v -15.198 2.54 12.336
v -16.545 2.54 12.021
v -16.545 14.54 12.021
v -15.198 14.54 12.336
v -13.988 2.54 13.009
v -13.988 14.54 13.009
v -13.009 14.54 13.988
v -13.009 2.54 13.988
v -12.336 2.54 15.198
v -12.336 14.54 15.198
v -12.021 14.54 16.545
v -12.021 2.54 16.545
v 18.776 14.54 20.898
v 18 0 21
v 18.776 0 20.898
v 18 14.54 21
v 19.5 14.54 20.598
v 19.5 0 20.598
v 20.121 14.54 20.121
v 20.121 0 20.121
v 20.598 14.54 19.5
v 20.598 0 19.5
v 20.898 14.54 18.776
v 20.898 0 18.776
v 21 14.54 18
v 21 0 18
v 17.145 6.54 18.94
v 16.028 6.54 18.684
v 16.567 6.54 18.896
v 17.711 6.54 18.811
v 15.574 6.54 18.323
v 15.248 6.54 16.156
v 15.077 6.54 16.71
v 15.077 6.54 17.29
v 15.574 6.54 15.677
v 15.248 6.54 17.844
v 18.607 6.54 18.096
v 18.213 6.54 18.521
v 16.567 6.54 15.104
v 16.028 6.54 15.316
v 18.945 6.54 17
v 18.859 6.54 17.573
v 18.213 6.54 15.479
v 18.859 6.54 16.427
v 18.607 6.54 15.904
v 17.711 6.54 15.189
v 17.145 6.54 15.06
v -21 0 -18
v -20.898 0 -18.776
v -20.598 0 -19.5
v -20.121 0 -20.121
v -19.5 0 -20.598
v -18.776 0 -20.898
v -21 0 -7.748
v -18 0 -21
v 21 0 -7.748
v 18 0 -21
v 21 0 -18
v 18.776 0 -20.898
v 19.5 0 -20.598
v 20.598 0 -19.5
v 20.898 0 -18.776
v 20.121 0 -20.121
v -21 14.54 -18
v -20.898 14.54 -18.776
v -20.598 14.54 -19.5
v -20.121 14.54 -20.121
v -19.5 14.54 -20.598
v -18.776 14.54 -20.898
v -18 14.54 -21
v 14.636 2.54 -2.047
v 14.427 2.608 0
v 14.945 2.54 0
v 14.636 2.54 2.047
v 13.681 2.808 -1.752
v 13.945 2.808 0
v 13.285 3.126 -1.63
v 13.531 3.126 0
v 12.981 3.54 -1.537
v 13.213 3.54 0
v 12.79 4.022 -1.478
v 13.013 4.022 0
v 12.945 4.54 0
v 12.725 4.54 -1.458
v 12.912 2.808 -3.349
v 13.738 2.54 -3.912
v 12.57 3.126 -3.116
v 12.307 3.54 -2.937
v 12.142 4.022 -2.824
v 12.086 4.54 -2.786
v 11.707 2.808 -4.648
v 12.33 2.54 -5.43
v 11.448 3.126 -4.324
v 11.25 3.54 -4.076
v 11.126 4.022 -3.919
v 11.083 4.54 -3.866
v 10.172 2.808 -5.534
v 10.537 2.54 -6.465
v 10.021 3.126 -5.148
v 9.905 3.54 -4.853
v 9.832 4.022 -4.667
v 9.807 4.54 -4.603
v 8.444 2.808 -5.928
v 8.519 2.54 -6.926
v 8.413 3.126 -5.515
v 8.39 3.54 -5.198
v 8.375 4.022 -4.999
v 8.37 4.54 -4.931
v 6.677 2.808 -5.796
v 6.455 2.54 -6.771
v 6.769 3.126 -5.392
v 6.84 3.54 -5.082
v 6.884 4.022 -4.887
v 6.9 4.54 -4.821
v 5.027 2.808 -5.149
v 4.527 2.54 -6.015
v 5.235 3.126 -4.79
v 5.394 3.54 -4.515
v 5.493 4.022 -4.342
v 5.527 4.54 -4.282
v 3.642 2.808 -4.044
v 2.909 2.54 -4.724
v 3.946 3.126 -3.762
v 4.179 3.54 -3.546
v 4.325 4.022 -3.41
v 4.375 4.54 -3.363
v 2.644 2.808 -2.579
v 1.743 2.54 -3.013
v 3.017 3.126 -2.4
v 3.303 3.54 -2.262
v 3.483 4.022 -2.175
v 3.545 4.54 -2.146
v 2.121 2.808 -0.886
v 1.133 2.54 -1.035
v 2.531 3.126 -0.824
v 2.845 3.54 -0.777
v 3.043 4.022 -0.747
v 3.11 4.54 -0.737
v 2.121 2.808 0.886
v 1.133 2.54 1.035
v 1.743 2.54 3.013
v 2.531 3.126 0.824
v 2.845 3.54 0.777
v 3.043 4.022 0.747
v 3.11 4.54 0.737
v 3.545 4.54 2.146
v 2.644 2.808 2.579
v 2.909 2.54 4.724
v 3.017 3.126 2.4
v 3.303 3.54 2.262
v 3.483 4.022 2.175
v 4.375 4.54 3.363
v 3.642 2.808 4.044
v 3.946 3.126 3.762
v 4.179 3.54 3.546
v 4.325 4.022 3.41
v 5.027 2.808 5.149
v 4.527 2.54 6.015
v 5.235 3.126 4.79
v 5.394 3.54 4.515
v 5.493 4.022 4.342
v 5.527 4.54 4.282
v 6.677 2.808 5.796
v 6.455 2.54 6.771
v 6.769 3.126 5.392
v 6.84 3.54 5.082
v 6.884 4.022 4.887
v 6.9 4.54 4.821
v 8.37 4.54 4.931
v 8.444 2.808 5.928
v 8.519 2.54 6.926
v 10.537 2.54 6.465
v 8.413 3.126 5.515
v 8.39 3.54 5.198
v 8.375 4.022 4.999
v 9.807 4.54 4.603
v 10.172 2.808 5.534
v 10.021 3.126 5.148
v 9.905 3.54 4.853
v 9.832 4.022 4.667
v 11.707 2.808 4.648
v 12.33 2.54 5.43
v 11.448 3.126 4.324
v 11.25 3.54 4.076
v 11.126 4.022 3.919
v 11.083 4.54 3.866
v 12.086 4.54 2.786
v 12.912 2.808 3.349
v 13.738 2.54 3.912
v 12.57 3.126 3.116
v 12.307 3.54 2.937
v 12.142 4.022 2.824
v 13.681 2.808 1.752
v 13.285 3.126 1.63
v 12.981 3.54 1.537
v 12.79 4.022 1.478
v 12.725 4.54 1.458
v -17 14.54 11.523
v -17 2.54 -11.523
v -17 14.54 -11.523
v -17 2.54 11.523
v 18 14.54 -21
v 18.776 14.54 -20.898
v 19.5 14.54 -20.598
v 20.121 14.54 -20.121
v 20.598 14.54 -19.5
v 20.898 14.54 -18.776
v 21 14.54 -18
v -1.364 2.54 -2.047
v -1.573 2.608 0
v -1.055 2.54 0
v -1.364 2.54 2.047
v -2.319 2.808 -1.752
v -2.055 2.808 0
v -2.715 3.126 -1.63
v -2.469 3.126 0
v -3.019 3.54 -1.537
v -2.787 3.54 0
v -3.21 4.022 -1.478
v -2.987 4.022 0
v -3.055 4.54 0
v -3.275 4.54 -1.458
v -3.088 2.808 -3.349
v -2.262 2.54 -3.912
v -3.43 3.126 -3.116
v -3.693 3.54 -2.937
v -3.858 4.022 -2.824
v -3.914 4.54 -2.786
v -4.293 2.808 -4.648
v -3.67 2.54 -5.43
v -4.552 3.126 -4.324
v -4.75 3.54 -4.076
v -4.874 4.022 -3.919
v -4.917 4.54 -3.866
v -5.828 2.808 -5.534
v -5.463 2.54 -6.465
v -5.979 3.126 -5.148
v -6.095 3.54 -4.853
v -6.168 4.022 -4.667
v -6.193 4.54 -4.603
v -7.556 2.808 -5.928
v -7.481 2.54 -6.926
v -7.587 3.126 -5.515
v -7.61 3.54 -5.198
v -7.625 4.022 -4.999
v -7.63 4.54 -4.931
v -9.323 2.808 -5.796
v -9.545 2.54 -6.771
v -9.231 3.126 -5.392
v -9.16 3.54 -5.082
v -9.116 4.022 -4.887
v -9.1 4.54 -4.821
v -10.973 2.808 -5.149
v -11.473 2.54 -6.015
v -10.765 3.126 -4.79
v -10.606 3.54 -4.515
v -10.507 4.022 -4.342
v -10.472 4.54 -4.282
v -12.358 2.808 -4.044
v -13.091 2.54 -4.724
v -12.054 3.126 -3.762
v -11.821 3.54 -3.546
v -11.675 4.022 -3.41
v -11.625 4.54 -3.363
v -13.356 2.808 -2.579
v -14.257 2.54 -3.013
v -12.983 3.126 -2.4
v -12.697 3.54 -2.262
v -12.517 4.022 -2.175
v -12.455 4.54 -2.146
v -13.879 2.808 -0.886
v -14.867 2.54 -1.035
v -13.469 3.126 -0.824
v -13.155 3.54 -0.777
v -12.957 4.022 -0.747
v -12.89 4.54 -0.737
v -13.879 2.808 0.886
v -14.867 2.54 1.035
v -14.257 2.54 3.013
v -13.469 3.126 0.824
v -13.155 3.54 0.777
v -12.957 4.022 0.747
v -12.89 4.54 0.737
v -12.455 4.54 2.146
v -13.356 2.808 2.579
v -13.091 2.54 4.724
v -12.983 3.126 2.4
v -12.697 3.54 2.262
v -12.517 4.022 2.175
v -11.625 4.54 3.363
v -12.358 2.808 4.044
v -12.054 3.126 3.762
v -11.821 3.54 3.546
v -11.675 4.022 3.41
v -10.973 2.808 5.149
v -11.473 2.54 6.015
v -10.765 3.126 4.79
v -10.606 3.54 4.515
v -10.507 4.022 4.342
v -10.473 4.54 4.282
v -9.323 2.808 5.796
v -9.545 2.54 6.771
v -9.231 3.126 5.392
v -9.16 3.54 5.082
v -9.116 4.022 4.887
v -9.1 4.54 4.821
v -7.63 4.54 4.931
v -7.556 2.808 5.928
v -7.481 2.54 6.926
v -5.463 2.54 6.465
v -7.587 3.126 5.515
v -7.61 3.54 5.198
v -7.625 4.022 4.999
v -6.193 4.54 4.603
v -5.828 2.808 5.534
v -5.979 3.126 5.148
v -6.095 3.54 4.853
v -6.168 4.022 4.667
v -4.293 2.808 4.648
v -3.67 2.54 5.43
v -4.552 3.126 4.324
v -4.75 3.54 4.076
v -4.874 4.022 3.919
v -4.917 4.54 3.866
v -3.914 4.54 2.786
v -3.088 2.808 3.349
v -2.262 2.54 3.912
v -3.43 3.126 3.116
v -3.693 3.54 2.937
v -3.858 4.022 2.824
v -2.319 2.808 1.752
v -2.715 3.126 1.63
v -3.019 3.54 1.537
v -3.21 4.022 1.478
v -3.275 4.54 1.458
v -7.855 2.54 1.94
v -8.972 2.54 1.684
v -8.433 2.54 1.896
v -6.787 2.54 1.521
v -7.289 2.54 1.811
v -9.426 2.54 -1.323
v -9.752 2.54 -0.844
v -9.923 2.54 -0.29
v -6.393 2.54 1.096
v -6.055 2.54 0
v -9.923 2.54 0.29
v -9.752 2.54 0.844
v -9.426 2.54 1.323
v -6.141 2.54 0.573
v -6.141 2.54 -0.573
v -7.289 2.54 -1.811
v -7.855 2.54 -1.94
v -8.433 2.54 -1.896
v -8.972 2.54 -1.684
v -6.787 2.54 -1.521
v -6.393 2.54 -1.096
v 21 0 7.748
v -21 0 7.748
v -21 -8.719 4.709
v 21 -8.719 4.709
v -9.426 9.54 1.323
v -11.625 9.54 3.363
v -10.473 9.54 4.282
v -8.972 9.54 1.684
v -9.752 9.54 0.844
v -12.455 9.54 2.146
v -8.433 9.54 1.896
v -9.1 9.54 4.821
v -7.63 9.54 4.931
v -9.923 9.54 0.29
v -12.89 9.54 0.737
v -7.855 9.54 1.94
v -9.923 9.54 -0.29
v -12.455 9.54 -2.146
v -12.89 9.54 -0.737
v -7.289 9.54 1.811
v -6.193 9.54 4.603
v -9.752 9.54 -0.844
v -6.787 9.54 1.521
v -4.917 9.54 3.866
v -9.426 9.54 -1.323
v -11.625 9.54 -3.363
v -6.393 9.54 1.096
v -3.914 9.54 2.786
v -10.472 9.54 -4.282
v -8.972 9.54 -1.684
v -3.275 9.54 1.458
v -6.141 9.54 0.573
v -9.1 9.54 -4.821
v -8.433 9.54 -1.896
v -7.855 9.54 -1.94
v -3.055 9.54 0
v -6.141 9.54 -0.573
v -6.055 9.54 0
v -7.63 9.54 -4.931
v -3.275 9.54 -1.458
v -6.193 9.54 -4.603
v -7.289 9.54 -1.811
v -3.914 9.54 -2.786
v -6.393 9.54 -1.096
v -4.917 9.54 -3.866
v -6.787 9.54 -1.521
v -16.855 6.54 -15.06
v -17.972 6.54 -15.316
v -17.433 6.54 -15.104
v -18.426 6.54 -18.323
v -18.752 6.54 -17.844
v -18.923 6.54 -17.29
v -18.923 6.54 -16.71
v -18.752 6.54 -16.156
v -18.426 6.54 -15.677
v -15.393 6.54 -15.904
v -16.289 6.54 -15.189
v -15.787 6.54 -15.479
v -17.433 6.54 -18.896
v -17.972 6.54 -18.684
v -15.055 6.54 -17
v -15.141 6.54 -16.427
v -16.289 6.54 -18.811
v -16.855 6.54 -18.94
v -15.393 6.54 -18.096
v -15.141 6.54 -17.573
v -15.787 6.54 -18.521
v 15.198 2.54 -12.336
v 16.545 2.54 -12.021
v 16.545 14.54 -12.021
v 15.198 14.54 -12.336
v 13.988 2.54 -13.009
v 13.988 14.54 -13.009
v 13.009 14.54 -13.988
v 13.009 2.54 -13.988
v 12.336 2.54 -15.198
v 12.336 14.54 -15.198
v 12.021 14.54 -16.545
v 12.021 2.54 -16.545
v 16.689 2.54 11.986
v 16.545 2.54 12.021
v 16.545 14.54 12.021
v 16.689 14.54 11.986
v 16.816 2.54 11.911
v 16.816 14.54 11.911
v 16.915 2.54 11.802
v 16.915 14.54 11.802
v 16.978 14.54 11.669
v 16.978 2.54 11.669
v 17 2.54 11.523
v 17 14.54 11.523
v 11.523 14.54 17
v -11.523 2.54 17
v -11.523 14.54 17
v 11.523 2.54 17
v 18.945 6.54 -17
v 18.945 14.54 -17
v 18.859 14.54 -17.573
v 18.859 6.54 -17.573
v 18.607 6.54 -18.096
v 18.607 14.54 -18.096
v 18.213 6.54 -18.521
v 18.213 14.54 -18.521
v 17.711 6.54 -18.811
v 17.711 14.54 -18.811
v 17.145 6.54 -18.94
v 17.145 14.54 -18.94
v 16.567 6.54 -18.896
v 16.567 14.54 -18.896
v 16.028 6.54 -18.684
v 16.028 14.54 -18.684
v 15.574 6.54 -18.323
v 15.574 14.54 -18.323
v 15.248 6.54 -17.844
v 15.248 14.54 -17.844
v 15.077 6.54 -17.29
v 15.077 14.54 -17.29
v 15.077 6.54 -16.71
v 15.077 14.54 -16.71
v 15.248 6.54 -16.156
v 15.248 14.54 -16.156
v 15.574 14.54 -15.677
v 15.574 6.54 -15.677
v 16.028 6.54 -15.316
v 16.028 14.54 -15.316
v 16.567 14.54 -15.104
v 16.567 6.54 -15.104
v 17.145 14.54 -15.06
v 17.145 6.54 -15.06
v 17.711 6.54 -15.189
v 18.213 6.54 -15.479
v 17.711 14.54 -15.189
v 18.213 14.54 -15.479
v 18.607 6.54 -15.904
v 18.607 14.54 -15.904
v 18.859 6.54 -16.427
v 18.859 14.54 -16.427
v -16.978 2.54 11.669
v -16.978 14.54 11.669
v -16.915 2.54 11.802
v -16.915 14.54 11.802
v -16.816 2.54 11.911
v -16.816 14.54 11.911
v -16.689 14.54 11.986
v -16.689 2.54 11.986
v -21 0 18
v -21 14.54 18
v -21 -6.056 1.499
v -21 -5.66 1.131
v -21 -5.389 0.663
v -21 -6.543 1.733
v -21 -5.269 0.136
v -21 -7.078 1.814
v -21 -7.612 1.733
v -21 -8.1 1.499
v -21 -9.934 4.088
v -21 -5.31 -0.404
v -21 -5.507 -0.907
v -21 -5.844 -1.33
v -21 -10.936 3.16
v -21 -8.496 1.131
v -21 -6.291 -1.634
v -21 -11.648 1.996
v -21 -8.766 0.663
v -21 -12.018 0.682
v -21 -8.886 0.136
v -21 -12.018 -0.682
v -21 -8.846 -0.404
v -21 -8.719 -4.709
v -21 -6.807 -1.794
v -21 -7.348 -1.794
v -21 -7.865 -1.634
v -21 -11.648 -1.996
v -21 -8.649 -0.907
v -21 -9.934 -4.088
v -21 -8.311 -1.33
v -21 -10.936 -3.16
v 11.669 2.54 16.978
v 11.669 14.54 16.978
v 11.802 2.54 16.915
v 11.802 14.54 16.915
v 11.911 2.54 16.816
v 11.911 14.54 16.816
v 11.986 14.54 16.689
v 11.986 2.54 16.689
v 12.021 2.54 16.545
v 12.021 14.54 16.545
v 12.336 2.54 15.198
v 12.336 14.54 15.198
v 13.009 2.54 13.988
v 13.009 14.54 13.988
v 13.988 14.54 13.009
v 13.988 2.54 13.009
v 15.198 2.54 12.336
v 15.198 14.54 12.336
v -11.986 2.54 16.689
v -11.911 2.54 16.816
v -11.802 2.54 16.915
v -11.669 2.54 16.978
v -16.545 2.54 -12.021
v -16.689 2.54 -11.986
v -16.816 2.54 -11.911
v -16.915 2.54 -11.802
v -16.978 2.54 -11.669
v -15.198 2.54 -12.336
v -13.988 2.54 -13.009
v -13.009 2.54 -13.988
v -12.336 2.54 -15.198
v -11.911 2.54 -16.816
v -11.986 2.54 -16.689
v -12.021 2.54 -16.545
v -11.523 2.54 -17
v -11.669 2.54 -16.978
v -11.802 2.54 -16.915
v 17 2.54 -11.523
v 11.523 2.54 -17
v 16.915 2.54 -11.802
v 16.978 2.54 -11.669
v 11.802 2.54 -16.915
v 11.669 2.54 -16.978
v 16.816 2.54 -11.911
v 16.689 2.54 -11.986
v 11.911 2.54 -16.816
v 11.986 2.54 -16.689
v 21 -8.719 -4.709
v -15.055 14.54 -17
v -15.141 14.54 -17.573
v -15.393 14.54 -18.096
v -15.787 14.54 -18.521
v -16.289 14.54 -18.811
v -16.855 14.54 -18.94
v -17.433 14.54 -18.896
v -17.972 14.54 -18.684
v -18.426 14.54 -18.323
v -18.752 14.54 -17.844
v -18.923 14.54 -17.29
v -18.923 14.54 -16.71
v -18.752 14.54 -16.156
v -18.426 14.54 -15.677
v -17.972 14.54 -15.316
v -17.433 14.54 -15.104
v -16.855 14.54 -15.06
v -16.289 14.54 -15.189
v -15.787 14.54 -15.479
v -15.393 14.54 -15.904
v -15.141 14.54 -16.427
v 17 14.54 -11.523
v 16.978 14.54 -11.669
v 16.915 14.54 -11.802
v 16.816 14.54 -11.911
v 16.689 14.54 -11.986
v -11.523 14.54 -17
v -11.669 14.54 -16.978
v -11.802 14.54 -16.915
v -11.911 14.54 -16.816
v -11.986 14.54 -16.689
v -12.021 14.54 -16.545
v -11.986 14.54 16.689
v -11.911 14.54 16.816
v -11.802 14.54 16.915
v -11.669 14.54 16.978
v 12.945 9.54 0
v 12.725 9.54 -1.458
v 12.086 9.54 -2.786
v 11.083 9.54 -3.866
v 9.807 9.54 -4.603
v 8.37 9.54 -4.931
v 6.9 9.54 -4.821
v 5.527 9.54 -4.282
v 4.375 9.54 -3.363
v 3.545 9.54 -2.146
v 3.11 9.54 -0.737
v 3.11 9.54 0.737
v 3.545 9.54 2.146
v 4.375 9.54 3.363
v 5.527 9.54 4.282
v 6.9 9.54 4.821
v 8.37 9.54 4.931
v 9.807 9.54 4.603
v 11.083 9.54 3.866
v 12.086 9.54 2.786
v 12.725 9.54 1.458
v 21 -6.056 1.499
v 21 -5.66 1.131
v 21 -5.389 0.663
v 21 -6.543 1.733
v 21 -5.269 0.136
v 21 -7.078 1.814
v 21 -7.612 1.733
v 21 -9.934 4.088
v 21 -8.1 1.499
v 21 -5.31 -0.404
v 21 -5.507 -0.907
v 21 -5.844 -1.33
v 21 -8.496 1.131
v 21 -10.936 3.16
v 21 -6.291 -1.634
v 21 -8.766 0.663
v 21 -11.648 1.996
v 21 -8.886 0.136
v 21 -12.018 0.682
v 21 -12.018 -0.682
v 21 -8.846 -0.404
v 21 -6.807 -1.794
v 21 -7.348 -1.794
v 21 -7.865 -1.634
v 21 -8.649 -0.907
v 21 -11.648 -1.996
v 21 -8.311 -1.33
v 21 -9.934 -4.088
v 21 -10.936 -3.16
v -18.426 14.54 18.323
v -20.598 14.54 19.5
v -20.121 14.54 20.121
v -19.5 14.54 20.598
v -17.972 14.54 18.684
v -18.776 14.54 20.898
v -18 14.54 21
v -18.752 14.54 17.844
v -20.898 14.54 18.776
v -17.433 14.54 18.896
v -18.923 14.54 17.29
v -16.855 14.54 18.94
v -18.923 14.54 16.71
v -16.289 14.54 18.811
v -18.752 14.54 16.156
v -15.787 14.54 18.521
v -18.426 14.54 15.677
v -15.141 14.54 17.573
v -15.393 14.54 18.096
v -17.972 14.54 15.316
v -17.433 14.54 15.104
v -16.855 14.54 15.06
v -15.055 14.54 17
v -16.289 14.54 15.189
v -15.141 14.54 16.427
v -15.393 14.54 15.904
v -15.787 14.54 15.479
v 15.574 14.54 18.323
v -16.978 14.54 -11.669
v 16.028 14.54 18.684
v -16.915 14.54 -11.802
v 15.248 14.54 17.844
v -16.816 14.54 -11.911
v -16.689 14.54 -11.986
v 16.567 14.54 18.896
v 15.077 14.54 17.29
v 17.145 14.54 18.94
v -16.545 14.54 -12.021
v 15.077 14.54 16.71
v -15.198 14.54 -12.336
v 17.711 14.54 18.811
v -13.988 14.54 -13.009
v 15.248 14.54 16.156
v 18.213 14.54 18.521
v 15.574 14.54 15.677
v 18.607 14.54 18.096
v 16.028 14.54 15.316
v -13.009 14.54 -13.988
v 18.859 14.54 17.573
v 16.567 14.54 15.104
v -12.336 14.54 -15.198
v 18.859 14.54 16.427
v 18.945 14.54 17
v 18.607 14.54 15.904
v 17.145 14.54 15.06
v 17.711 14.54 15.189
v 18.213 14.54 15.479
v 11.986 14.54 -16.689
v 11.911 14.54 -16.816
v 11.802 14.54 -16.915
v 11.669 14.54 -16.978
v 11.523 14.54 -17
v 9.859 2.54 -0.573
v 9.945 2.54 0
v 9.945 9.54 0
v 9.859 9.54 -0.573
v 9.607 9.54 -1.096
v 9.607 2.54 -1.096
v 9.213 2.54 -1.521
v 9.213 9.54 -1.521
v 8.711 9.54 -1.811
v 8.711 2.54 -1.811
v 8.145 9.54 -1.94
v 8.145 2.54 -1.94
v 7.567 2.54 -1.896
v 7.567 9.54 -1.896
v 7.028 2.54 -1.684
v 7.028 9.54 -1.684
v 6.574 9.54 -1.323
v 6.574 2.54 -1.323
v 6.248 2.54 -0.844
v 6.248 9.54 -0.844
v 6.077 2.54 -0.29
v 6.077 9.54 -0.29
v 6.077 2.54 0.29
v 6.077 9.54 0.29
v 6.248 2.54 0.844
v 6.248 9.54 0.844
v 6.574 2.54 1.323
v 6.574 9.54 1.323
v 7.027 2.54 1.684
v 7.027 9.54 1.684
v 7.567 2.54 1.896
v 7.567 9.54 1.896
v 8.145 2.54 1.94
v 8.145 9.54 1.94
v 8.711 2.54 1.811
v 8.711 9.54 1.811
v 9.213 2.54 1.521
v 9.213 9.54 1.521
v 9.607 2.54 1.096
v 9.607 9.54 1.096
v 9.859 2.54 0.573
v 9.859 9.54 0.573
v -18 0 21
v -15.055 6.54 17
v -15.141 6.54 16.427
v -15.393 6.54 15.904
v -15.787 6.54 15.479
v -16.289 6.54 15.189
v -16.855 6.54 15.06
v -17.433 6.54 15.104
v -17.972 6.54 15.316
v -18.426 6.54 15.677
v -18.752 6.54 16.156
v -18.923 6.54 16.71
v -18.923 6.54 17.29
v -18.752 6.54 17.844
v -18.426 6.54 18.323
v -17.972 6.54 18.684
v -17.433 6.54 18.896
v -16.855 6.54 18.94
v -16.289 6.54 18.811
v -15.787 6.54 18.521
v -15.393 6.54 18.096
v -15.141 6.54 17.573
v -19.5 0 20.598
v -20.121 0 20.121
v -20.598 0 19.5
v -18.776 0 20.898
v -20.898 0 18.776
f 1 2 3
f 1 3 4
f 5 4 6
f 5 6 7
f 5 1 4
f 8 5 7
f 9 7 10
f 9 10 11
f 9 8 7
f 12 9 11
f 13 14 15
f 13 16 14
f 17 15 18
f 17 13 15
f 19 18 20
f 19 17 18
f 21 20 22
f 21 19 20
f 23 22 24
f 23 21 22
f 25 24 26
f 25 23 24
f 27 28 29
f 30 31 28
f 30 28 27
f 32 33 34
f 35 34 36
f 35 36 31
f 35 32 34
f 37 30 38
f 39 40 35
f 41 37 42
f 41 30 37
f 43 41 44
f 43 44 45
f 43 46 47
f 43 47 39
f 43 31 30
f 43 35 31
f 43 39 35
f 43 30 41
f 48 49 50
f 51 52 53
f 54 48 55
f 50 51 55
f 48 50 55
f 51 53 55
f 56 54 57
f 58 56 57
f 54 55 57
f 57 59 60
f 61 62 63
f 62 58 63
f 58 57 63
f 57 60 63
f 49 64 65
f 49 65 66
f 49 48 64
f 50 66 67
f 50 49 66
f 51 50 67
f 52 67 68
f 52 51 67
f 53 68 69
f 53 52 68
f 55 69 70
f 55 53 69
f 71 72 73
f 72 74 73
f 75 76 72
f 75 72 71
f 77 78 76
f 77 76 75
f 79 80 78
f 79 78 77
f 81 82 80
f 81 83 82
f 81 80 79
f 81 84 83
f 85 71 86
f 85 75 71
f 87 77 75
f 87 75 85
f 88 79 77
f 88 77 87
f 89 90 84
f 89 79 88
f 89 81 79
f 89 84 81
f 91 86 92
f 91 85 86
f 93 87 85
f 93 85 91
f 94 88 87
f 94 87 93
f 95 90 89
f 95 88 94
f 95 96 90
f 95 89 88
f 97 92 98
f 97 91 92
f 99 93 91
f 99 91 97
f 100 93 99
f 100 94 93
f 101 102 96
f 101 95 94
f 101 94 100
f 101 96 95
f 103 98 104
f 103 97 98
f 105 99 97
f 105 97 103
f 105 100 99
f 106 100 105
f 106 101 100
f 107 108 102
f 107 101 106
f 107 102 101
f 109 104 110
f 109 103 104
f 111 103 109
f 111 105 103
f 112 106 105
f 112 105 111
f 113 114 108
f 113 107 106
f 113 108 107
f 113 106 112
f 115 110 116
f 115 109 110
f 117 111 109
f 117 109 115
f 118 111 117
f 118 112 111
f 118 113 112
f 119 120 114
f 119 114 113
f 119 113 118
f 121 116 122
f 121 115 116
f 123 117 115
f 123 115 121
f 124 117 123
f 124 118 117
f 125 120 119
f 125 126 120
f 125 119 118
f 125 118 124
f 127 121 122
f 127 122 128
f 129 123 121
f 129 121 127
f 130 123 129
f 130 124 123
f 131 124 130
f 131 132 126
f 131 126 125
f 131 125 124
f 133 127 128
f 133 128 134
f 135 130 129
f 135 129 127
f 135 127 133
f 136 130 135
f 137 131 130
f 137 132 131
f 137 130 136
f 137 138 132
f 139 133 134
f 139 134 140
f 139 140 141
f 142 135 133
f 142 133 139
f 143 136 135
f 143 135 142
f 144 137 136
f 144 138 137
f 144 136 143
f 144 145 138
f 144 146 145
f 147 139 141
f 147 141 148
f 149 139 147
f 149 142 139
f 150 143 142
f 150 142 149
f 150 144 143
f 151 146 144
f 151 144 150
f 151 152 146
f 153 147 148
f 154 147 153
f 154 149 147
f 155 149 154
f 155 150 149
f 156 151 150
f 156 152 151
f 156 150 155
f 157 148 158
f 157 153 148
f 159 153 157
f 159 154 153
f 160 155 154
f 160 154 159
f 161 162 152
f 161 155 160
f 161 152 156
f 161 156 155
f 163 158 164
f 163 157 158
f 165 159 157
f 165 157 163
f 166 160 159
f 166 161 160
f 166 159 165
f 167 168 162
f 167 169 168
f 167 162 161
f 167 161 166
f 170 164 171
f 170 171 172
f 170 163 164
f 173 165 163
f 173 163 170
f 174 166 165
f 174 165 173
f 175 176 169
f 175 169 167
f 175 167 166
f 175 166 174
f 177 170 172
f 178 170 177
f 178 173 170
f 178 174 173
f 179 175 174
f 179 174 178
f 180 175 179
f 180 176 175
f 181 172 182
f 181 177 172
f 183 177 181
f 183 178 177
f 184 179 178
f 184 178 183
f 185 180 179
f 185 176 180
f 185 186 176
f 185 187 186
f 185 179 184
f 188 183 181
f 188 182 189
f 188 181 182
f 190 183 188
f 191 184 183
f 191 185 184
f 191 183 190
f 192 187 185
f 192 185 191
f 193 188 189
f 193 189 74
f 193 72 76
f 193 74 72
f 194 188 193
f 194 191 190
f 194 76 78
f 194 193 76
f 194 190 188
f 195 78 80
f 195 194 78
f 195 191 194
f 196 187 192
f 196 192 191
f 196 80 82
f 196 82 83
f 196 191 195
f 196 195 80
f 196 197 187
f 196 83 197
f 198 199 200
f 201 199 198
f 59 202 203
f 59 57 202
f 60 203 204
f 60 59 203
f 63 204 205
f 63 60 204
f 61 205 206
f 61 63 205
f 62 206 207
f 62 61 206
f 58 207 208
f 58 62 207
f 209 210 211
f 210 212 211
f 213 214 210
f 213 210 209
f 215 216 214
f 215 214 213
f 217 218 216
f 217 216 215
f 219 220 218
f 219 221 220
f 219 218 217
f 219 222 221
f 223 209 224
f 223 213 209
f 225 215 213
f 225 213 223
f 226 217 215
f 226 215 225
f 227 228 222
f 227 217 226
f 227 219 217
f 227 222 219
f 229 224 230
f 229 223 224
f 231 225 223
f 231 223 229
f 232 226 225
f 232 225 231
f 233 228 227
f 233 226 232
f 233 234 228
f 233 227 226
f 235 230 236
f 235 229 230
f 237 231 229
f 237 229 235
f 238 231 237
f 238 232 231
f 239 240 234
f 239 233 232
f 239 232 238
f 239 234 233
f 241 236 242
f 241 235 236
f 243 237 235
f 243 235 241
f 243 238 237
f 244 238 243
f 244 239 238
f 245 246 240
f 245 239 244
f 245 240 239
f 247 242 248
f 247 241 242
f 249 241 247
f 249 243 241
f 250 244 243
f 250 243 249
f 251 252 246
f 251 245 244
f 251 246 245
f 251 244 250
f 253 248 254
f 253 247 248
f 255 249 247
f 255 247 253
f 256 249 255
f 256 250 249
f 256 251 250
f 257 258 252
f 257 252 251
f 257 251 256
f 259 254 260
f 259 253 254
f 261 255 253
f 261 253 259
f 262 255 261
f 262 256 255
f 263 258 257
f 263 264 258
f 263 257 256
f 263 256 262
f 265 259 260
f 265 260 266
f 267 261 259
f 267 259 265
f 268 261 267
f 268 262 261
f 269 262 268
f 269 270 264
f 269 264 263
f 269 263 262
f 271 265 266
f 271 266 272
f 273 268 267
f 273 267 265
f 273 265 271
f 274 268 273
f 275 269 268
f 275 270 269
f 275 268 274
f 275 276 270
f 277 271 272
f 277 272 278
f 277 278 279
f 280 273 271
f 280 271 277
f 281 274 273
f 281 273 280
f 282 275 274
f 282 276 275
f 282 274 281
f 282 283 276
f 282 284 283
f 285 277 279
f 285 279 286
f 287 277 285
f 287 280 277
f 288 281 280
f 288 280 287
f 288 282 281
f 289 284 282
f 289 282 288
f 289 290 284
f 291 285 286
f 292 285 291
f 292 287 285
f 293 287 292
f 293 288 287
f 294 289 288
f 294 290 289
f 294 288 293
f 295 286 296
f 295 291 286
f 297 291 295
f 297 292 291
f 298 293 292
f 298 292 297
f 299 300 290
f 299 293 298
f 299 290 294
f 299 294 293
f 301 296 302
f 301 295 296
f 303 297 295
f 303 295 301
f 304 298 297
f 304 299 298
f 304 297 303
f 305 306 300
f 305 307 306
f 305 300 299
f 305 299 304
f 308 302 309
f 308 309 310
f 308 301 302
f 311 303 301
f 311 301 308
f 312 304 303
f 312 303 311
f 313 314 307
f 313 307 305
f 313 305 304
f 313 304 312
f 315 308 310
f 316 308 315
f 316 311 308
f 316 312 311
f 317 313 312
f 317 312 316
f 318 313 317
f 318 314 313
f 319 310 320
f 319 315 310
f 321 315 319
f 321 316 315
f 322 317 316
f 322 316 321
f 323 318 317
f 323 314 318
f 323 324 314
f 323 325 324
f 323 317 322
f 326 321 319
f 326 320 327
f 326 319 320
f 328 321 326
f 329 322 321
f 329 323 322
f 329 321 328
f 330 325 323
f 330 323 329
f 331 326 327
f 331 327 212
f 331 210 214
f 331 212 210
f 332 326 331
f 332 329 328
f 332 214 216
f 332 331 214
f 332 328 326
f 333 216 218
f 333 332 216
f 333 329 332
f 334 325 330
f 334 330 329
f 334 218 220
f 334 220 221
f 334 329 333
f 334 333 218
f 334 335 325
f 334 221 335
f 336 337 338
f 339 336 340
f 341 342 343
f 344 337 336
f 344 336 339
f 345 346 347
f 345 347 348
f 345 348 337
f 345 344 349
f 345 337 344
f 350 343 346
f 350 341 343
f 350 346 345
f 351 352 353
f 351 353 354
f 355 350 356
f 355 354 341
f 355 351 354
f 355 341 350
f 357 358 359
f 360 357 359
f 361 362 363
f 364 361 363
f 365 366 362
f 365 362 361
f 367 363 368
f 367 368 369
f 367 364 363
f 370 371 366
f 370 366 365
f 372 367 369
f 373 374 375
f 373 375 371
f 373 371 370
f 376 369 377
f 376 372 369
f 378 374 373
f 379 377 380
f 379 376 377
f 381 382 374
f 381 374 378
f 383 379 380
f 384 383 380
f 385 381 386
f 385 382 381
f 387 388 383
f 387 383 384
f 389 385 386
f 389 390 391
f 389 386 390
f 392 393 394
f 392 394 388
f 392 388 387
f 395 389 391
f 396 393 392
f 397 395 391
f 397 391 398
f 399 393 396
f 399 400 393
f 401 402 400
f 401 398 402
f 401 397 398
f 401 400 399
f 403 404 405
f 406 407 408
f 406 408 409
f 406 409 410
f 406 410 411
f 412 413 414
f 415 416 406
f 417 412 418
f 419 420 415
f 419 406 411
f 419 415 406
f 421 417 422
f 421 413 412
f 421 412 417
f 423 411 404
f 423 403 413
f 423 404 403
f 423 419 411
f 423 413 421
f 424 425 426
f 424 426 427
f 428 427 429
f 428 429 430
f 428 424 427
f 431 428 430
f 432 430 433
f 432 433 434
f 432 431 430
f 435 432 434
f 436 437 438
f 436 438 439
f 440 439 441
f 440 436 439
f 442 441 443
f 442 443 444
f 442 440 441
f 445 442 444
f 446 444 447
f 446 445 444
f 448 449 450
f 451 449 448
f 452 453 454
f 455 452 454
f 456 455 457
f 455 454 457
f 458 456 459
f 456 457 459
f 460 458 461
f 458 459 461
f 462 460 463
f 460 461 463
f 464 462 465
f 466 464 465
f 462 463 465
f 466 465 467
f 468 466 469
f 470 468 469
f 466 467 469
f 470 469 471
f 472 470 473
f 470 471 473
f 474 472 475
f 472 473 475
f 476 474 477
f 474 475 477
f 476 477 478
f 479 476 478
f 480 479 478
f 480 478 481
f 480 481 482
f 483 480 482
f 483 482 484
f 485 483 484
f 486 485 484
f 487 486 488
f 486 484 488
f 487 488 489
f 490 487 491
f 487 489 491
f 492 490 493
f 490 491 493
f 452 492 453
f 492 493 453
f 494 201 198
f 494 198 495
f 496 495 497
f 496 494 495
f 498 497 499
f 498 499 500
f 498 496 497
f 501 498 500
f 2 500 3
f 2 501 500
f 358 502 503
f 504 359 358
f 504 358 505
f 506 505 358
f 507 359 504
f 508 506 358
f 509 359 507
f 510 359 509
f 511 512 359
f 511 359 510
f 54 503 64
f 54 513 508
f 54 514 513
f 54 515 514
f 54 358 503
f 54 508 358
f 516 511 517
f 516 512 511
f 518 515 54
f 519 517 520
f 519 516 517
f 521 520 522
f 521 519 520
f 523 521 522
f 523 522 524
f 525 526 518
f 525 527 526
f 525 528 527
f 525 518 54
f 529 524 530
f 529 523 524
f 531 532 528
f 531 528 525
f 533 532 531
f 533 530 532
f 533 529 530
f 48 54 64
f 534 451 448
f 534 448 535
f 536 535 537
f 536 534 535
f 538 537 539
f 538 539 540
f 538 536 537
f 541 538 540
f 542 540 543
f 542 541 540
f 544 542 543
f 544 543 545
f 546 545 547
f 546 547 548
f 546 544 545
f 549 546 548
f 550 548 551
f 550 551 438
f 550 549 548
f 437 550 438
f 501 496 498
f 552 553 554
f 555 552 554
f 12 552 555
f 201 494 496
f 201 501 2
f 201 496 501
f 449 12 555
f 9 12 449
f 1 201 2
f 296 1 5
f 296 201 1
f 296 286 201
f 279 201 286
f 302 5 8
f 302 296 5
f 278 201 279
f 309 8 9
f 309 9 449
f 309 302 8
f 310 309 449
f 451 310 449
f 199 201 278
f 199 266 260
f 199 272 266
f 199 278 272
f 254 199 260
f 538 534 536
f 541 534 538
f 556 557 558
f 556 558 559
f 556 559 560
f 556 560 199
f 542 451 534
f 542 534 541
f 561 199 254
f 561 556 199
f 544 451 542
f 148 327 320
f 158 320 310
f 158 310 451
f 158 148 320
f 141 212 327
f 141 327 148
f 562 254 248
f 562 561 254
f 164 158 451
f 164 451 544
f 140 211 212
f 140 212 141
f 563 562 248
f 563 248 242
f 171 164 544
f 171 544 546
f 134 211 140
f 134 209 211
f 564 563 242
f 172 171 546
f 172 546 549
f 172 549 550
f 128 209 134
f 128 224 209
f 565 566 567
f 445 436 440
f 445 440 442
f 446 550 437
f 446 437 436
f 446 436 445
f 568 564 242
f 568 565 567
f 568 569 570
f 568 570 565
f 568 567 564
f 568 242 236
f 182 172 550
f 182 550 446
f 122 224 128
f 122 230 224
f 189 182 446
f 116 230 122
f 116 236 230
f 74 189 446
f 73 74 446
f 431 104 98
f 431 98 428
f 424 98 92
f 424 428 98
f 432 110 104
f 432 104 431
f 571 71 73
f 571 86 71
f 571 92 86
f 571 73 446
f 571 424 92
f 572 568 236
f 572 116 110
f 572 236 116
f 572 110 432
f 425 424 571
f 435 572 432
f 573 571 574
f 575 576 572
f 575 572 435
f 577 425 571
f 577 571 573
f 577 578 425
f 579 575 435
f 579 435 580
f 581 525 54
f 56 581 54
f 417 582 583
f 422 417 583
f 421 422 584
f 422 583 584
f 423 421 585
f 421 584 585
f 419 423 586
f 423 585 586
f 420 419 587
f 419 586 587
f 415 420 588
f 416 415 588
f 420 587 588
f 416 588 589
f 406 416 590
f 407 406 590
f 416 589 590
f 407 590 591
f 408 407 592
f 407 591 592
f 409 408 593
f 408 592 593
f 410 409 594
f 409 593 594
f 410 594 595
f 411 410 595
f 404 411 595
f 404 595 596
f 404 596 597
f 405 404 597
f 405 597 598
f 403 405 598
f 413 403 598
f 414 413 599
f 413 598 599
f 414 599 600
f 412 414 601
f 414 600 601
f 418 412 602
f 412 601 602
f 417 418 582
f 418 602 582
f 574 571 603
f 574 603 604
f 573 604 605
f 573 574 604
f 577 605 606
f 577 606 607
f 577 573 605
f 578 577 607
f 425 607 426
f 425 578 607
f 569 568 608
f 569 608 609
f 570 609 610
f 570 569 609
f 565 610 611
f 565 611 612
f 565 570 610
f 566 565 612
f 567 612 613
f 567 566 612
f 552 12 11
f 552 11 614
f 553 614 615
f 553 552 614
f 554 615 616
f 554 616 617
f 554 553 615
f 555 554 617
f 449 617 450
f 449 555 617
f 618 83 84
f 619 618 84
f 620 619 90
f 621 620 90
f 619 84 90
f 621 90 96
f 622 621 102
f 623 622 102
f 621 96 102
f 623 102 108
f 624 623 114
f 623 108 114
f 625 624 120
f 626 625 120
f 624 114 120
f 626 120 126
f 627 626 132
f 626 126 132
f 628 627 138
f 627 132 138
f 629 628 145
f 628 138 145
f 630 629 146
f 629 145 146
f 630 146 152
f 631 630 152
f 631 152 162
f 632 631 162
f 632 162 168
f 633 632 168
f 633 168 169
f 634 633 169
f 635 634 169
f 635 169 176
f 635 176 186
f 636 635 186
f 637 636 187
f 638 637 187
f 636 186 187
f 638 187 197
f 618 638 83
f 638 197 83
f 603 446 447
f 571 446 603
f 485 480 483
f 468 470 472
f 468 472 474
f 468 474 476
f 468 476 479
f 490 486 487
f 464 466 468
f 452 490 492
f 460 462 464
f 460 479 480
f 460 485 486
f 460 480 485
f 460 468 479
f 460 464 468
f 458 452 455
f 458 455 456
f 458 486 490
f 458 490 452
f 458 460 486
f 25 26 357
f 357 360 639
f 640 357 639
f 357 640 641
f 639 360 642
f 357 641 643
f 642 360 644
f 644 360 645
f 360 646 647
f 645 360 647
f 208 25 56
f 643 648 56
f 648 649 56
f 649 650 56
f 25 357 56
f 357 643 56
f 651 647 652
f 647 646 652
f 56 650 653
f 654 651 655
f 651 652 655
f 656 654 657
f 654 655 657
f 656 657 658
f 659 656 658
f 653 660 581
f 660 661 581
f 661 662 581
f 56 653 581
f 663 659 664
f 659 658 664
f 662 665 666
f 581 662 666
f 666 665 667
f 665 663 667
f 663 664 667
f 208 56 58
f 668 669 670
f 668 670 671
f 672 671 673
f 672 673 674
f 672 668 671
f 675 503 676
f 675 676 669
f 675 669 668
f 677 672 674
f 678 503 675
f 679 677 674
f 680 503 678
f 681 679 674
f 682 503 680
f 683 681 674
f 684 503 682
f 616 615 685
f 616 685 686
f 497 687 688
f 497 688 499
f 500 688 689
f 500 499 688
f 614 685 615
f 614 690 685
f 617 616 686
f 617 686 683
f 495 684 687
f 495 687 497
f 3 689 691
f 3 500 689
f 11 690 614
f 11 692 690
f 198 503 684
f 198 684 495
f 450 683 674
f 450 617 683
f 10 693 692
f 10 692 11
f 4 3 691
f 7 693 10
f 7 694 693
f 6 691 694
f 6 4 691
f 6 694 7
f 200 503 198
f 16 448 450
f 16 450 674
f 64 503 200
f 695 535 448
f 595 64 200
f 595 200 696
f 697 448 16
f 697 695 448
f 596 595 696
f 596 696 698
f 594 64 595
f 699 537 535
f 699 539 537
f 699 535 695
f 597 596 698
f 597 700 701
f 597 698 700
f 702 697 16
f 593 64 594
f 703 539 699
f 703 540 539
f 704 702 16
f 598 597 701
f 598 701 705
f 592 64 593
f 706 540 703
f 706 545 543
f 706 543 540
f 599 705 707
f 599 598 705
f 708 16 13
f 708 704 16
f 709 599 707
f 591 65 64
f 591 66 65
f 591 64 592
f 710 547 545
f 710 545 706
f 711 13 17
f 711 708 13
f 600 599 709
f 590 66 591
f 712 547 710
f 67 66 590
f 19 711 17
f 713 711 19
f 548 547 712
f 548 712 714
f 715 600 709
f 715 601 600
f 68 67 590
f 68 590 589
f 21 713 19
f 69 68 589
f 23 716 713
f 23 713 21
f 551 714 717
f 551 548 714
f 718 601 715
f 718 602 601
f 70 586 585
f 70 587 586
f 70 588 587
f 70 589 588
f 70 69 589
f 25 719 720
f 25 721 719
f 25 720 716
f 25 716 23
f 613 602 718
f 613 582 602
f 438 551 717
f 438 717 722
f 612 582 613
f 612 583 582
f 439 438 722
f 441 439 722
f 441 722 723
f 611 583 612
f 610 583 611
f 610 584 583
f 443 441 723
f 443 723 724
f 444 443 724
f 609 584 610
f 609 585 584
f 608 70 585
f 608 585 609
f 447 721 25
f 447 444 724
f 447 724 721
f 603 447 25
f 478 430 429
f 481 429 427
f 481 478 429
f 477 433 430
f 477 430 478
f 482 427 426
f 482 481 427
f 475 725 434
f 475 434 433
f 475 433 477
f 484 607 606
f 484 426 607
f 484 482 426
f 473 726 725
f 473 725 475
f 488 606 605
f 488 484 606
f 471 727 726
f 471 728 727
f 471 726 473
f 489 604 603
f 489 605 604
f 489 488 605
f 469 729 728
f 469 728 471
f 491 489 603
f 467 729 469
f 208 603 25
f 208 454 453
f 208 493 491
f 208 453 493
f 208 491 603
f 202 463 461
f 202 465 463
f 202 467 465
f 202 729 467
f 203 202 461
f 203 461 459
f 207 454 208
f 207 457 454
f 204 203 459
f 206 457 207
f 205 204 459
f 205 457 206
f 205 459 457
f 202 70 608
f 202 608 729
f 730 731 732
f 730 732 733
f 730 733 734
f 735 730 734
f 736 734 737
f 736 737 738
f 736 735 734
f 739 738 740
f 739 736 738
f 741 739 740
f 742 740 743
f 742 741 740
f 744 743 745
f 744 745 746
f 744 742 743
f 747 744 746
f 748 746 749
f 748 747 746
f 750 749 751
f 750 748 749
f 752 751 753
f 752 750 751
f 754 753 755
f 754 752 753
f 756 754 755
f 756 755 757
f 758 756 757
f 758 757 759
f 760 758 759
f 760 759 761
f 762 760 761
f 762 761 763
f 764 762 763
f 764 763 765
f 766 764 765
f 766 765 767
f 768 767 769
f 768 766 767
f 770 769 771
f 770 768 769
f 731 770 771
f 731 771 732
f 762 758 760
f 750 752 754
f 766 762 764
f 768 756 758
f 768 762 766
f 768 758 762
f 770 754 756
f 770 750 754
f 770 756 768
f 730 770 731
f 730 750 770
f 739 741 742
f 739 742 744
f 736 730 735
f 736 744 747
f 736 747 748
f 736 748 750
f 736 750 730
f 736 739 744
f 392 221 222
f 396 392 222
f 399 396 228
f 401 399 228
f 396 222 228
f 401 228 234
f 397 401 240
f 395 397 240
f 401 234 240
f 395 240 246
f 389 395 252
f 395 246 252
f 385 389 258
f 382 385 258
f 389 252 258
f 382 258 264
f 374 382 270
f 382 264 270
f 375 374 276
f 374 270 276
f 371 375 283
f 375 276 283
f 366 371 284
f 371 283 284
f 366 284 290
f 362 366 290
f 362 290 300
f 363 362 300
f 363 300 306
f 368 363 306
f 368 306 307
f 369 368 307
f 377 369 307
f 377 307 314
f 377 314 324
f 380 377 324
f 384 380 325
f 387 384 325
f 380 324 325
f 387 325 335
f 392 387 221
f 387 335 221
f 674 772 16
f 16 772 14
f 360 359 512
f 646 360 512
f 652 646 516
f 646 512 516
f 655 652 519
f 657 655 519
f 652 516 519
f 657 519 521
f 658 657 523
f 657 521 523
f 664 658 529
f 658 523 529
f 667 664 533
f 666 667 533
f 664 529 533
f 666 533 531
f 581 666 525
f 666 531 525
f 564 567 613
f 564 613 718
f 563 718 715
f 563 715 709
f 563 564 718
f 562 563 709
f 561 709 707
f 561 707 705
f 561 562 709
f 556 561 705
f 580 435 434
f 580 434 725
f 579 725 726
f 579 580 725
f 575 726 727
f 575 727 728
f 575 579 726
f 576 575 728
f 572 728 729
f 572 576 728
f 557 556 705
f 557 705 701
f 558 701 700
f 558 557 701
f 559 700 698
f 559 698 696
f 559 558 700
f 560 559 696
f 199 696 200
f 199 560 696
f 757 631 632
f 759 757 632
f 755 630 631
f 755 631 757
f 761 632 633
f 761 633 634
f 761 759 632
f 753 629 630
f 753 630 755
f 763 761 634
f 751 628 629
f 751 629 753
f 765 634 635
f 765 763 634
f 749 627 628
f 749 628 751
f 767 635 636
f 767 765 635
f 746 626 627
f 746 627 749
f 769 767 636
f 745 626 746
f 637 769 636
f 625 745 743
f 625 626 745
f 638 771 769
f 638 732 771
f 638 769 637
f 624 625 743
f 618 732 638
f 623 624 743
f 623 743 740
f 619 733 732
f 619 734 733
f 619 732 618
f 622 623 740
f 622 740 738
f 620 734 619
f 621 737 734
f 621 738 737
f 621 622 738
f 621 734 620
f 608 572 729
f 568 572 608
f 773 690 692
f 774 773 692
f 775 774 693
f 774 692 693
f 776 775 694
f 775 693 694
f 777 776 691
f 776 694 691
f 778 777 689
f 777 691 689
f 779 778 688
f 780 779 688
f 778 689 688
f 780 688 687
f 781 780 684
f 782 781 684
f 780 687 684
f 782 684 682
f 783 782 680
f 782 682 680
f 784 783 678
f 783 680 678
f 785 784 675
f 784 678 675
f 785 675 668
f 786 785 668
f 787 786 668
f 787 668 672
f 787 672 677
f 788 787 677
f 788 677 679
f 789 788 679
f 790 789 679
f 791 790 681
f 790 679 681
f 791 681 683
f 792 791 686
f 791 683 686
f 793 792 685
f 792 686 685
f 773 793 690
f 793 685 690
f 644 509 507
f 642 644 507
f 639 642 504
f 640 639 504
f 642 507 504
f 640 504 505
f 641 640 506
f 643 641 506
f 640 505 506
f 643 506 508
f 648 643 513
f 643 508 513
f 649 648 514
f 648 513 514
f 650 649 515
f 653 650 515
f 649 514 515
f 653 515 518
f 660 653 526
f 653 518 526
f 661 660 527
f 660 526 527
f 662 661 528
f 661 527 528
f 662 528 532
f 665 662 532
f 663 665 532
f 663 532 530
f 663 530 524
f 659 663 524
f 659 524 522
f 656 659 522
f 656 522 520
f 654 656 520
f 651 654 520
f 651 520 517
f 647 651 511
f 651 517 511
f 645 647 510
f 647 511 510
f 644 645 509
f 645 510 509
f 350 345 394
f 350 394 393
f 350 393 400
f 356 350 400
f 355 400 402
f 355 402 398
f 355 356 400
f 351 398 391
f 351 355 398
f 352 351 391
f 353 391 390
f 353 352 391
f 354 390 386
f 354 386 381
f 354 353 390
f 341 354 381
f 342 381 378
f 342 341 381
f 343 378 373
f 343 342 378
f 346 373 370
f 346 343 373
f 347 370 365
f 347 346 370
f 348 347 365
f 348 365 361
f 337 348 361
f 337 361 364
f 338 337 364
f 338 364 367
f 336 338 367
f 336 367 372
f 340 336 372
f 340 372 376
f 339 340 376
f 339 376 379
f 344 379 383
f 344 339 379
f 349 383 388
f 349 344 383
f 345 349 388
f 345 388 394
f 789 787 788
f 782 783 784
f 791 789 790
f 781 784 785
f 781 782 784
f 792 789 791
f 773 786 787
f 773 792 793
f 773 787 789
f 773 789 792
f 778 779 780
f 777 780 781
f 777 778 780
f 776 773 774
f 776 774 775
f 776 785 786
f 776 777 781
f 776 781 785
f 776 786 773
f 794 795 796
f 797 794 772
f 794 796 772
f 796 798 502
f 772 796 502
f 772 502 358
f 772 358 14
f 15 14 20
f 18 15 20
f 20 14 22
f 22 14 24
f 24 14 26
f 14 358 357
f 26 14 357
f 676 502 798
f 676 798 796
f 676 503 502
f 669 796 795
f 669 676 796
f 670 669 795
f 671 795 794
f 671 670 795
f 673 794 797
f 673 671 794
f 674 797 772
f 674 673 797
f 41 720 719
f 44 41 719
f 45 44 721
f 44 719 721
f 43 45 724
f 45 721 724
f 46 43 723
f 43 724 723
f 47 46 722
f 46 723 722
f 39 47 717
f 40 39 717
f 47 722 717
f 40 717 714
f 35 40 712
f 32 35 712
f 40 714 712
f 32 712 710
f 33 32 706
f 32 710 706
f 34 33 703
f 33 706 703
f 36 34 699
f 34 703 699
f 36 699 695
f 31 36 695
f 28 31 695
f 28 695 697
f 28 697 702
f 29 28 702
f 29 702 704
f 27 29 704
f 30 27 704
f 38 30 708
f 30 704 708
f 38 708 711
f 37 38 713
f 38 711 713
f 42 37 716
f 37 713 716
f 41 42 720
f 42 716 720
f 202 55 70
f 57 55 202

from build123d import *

# Parameters (mm, degrees)
SKETCH1_W           = 42
SKETCH1_H           = 42
BOSS_EXTRUDE1_DEPTH = 2.54
SKETCH2_W           = 42
SKETCH2_H           = 42
BOSS_EXTRUDE2_DEPTH = 12
SKETCH4_R           = 1.813765306
BOSS_EXTRUDE4_DEPTH = 42
SKETCH9_R           = 4.945
SKETCH9_R_2         = 1.945
BOSS_EXTRUDE5_DEPTH = 7
SKETCH10_R          = 1.945
CUT_EXTRUDE1_DEPTH  = 8
FILLET1_R           = 3
FILLET3_R           = 2


with BuildPart() as part:
    # Sketch1 → Boss-Extrude1 (new body)
    with BuildSketch(Plane(origin=(0, 0, 0), x_dir=(1, 0, 0), z_dir=(0, 1, 0))):
        Rectangle(SKETCH1_W, SKETCH1_H)
    extrude(amount=BOSS_EXTRUDE1_DEPTH)

    # Sketch2 → Boss-Extrude2 (add)
    with BuildSketch(Plane(origin=(0, 2.54, 0), x_dir=(1, 0, 0), z_dir=(0, 1, 0))):
        Rectangle(SKETCH2_W, SKETCH2_H)
        with BuildLine():
            Line((-17, 11.522774425), (-17, -11.522774425))
            ThreePointArc((-17, -11.522774425), (-16.869274473, -11.859874356), (-16.545454545, -12.020704023))
            ThreePointArc((-16.545454545, -12.020704023), (-13.464466094, -13.464466094), (-12.020704023, -16.545454545))
            ThreePointArc((-12.020704023, -16.545454545), (-11.859874356, -16.869274473), (-11.522774425, -17))
            Line((-11.522774425, -17), (11.522774425, -17))
            ThreePointArc((11.522774425, -17), (11.859874356, -16.869274473), (12.020704023, -16.545454545))
            ThreePointArc((12.020704023, -16.545454545), (13.464466094, -13.464466094), (16.545454545, -12.020704023))
            ThreePointArc((16.545454545, -12.020704023), (16.869274473, -11.859874356), (17, -11.522774425))
            Line((17, -11.522774425), (17, 11.522774425))
            ThreePointArc((17, 11.522774425), (16.869274473, 11.859874356), (16.545454545, 12.020704023))
            ThreePointArc((16.545454545, 12.020704023), (13.464466094, 13.464466094), (12.020704023, 16.545454545))
            ThreePointArc((12.020704023, 16.545454545), (11.859874356, 16.869274473), (11.522774425, 17))
            Line((11.522774425, 17), (-11.522774425, 17))
            ThreePointArc((-11.522774425, 17), (-11.859874356, 16.869274473), (-12.020704023, 16.545454545))
            ThreePointArc((-12.020704023, 16.545454545), (-13.464466094, 13.464466094), (-16.545454545, 12.020704023))
            ThreePointArc((-16.545454545, 12.020704023), (-16.869274473, 11.859874356), (-17, 11.522774425))
        make_face(mode=Mode.SUBTRACT)
    extrude(amount=BOSS_EXTRUDE2_DEPTH)

    # Sketch4 → Boss-Extrude4 (add)
    with BuildSketch(Plane.ZY.offset(21)):
        with BuildLine():
            Line((7.748459825, 0), (4.708955343, -8.719310622))
            ThreePointArc((4.708955343, -8.719310622), (0, -12.064660663), (-4.708955343, -8.719310622))
            Line((-4.708955343, -8.719310622), (-7.748459825, 0))
            Line((-7.748459825, 0), (7.748459825, 0))
        make_face()
        with Locations((0, -7.077794281)):
            Circle(SKETCH4_R, mode=Mode.SUBTRACT)
    extrude(amount=-BOSS_EXTRUDE4_DEPTH)

    # Sketch9 → Boss-Extrude5 (add)
    with BuildSketch(Plane(origin=(0, 2.54, 0), x_dir=(1, 0, 0), z_dir=(0, 1, 0))):
        with Locations((8, 0)):
            Circle(SKETCH9_R)
        with Locations((8, 0)):
            Circle(SKETCH9_R_2, mode=Mode.SUBTRACT)
        with Locations((-8, 0)):
            Circle(SKETCH9_R)
        with Locations((-8, 0)):
            Circle(SKETCH9_R_2, mode=Mode.SUBTRACT)
    extrude(amount=BOSS_EXTRUDE5_DEPTH)

    # Sketch10 → Cut-Extrude1 (cut)
    with BuildSketch(Plane(origin=(0, 14.54, 0), x_dir=(1, 0, 0), z_dir=(0, 1, 0))):
        with Locations((-17, 17)):
            Circle(SKETCH10_R)
        with Locations((17, 17)):
            Circle(SKETCH10_R)
        with Locations((-17, -17)):
            Circle(SKETCH10_R)
        with Locations((17, -17)):
            Circle(SKETCH10_R)
    extrude(amount=-CUT_EXTRUDE1_DEPTH, mode=Mode.SUBTRACT)

    # Fillet1
    fillet1_edges = [part.edges().sort_by_distance(p)[0] for p in [
        (21, 7.27, 21),
        (-21, 7.27, 21),
        (-21, 7.27, -21),
        (21, 7.27, -21),
    ]]
    fillet(fillet1_edges, radius=FILLET1_R)

    # Fillet3
    fillet3_edges = [part.edges().sort_by_distance(p)[0] for p in [
        (3.055, 2.54, 0),
        (-12.945, 2.54, 0),
    ]]
    fillet(fillet3_edges, radius=FILLET3_R)


solid = part.part
